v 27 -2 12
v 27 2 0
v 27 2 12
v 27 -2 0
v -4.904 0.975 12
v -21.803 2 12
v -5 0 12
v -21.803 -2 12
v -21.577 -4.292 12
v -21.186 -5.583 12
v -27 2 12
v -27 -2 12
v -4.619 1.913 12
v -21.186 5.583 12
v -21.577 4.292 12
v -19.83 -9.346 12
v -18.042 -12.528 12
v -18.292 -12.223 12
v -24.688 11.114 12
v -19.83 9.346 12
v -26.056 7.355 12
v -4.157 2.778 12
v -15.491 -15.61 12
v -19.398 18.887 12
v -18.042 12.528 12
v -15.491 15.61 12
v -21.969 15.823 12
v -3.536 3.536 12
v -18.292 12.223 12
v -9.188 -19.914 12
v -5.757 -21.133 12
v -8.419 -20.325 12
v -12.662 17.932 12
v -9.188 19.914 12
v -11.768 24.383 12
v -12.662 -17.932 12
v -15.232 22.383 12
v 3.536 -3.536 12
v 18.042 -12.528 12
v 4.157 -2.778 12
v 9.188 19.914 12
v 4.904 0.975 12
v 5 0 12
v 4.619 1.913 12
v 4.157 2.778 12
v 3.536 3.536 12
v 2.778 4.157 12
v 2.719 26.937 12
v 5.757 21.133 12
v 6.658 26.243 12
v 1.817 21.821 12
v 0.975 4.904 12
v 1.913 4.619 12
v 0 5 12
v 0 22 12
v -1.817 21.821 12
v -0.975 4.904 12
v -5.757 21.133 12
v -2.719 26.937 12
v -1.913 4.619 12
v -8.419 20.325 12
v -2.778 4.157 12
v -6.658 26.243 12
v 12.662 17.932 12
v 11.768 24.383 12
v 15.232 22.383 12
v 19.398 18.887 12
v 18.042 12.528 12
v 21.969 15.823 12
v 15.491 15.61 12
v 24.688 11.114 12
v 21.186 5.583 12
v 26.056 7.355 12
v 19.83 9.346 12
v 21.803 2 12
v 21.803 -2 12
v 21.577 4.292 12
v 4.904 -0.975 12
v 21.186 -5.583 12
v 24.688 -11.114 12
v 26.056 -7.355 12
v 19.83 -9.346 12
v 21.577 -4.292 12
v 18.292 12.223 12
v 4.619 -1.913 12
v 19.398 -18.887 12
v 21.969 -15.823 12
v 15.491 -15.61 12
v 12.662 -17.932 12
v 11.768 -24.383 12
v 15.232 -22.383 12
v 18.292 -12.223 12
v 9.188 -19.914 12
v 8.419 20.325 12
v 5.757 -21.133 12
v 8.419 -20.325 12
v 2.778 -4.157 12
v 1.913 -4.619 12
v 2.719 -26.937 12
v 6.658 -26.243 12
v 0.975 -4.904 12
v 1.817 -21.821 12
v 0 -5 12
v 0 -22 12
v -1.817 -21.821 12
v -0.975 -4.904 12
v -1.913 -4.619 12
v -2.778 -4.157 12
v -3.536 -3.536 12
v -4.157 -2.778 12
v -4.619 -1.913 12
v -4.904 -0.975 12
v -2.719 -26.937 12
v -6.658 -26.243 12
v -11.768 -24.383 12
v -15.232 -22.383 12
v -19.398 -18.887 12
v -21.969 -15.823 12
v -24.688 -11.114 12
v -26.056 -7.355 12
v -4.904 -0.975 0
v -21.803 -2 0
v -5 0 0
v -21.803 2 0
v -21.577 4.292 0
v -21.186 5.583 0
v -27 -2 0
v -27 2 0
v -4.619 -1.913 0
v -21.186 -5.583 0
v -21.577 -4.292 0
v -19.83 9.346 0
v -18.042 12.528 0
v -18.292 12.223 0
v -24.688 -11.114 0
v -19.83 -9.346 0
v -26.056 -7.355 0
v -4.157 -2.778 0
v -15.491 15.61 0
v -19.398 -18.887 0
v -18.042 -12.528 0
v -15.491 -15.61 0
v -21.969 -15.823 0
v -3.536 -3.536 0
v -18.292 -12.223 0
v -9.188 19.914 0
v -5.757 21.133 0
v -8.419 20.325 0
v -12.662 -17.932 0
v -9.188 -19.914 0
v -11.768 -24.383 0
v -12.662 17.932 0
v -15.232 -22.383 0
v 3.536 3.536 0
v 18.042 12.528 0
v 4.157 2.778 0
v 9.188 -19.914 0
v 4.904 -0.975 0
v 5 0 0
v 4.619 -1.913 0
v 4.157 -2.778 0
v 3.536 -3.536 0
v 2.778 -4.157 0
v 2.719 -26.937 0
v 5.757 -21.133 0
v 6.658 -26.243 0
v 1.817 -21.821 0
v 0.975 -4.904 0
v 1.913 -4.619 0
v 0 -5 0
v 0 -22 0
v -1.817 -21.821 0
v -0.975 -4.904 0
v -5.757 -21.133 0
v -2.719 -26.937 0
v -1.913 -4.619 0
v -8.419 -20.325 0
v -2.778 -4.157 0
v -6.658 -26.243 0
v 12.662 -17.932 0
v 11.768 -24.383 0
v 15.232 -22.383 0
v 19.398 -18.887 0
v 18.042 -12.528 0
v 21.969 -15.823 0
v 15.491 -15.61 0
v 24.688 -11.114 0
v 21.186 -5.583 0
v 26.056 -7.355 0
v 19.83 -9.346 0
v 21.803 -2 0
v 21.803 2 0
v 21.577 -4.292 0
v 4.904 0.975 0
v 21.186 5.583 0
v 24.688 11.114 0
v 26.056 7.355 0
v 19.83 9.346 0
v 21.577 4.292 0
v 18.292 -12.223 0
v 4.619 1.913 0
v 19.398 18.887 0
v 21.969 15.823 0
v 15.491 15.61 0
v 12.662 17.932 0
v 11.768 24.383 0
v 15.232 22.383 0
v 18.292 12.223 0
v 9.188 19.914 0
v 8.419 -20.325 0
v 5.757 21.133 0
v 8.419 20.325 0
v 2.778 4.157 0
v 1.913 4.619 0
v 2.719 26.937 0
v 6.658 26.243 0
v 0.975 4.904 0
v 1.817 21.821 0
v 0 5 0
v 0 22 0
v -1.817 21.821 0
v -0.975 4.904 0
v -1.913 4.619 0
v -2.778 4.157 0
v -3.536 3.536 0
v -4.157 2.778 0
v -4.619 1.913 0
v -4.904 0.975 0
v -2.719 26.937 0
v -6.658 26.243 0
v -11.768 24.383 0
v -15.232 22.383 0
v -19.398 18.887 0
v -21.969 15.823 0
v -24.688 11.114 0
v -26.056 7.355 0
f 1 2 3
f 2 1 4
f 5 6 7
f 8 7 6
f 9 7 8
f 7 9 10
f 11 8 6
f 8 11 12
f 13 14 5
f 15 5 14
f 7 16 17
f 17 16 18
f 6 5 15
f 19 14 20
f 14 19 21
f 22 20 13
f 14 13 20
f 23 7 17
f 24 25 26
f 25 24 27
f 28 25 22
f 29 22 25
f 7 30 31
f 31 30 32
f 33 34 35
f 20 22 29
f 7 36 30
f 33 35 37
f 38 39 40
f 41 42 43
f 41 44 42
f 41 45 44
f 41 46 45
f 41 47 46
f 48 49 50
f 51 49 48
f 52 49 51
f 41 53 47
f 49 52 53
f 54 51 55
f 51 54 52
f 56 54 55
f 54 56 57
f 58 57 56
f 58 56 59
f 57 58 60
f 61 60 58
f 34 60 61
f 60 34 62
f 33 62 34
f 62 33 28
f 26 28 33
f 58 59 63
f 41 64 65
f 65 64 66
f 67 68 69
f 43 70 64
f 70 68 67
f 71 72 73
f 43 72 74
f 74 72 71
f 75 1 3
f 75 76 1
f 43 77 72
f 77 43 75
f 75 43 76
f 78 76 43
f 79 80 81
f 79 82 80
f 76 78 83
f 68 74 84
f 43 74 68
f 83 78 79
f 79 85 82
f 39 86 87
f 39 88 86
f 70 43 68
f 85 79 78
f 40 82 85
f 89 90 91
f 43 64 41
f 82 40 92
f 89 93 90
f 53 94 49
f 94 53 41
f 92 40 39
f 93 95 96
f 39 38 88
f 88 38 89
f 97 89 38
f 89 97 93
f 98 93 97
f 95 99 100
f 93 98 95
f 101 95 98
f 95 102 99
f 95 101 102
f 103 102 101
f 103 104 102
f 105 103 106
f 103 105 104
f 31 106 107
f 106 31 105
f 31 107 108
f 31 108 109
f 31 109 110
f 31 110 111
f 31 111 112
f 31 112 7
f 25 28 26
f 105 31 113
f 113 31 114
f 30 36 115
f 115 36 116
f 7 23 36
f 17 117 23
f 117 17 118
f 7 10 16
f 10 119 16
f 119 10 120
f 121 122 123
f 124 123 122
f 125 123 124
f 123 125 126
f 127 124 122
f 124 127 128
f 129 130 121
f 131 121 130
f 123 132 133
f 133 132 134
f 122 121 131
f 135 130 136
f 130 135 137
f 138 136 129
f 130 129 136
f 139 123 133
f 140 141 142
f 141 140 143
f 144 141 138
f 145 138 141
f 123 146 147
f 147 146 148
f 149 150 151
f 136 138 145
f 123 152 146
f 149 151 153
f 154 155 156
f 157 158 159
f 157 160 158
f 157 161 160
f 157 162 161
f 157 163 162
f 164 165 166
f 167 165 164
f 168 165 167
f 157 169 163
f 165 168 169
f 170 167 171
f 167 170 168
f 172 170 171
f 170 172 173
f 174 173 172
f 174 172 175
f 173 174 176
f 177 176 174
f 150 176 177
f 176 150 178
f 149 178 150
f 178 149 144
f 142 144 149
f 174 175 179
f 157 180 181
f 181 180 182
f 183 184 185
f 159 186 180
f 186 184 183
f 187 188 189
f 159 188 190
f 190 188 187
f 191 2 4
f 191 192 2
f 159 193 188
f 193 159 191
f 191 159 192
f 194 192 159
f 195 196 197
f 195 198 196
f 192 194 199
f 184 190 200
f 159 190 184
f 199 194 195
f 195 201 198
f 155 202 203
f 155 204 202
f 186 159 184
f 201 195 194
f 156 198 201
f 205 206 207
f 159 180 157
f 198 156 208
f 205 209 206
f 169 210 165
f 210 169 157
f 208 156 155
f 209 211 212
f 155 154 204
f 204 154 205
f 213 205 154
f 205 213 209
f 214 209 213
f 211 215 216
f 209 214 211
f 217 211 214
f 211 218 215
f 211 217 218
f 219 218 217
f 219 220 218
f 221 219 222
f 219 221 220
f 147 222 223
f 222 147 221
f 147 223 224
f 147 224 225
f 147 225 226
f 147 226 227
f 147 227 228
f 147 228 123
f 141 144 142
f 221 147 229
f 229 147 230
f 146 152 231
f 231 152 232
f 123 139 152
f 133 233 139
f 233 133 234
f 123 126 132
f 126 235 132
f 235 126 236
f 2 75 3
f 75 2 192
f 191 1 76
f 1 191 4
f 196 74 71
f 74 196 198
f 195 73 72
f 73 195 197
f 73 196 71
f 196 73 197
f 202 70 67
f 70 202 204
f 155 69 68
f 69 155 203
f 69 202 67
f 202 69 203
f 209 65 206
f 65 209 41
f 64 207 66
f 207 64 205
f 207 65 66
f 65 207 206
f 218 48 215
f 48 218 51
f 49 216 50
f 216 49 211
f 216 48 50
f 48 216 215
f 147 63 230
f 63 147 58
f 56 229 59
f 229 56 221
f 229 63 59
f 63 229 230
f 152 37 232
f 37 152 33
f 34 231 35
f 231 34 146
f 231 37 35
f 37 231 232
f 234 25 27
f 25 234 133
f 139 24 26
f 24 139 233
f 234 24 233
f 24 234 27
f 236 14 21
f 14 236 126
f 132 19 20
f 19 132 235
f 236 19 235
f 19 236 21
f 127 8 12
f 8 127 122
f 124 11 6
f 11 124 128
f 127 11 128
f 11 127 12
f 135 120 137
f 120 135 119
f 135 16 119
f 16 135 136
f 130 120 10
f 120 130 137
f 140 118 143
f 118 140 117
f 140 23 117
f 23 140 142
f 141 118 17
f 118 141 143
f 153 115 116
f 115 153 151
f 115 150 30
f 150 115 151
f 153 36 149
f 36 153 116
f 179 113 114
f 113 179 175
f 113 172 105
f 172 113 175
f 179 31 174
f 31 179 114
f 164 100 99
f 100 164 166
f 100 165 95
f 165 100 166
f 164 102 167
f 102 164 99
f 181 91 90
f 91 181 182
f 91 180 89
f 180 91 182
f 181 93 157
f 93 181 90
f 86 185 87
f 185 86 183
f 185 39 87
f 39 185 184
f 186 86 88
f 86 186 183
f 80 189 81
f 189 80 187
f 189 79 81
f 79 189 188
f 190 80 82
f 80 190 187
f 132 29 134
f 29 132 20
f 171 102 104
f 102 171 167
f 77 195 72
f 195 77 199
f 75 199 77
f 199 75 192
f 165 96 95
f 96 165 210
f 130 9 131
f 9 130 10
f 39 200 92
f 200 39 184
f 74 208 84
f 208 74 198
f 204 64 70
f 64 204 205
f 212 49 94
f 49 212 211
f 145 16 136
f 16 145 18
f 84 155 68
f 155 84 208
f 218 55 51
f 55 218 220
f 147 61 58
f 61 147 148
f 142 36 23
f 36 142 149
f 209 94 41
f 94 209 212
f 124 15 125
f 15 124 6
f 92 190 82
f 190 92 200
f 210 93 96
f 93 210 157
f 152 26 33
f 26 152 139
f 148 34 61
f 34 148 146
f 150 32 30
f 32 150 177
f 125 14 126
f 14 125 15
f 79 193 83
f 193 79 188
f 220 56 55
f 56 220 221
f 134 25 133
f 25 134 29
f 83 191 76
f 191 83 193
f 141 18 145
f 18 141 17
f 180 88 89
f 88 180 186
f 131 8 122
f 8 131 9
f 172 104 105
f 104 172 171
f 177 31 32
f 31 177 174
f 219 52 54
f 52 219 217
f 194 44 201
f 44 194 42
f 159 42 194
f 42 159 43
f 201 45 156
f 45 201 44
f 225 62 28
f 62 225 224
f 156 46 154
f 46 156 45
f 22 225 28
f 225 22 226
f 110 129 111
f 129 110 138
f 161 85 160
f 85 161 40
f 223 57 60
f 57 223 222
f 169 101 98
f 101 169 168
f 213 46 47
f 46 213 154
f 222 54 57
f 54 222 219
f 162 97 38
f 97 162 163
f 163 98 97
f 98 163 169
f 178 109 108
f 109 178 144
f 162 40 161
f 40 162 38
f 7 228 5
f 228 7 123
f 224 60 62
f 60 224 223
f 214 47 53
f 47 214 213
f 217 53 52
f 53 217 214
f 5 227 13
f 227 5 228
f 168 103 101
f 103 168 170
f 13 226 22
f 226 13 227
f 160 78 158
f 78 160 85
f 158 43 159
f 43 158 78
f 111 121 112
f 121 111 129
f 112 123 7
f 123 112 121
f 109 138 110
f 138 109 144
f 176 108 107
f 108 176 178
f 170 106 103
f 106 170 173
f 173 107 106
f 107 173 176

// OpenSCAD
$fn = 32;

// ----------------------------------------------------------------------
// Spur blank: bored gear blank
// ----------------------------------------------------------------------

// --- parameters (mm) ---
disc_r = 22;              // blank root radius
disc_t = 12;              // blank thickness
n_teeth = 18;             // stub tooth count
tooth_w = 4;              // tooth width at the root
tooth_h = 5;              // tooth height above the root
bore_r = 5;               // central bore radius

out_r = disc_r + tooth_h;  // tip radius
bbox_x = 54.0;  // measured width over the teeth
bbox_y = 53.87;  // measured depth over the teeth

difference() {
union() {
  cylinder(r = disc_r, h = disc_t);
  for (i = [0 : n_teeth - 1])
    rotate([0, 0, i * 360 / n_teeth])
      translate([disc_r - 1, -tooth_w / 2, 0])
        cube([tooth_h + 1, tooth_w, disc_t]);
}
  translate([0, 0, -1]) cylinder(r = bore_r, h = disc_t + 2);
}
